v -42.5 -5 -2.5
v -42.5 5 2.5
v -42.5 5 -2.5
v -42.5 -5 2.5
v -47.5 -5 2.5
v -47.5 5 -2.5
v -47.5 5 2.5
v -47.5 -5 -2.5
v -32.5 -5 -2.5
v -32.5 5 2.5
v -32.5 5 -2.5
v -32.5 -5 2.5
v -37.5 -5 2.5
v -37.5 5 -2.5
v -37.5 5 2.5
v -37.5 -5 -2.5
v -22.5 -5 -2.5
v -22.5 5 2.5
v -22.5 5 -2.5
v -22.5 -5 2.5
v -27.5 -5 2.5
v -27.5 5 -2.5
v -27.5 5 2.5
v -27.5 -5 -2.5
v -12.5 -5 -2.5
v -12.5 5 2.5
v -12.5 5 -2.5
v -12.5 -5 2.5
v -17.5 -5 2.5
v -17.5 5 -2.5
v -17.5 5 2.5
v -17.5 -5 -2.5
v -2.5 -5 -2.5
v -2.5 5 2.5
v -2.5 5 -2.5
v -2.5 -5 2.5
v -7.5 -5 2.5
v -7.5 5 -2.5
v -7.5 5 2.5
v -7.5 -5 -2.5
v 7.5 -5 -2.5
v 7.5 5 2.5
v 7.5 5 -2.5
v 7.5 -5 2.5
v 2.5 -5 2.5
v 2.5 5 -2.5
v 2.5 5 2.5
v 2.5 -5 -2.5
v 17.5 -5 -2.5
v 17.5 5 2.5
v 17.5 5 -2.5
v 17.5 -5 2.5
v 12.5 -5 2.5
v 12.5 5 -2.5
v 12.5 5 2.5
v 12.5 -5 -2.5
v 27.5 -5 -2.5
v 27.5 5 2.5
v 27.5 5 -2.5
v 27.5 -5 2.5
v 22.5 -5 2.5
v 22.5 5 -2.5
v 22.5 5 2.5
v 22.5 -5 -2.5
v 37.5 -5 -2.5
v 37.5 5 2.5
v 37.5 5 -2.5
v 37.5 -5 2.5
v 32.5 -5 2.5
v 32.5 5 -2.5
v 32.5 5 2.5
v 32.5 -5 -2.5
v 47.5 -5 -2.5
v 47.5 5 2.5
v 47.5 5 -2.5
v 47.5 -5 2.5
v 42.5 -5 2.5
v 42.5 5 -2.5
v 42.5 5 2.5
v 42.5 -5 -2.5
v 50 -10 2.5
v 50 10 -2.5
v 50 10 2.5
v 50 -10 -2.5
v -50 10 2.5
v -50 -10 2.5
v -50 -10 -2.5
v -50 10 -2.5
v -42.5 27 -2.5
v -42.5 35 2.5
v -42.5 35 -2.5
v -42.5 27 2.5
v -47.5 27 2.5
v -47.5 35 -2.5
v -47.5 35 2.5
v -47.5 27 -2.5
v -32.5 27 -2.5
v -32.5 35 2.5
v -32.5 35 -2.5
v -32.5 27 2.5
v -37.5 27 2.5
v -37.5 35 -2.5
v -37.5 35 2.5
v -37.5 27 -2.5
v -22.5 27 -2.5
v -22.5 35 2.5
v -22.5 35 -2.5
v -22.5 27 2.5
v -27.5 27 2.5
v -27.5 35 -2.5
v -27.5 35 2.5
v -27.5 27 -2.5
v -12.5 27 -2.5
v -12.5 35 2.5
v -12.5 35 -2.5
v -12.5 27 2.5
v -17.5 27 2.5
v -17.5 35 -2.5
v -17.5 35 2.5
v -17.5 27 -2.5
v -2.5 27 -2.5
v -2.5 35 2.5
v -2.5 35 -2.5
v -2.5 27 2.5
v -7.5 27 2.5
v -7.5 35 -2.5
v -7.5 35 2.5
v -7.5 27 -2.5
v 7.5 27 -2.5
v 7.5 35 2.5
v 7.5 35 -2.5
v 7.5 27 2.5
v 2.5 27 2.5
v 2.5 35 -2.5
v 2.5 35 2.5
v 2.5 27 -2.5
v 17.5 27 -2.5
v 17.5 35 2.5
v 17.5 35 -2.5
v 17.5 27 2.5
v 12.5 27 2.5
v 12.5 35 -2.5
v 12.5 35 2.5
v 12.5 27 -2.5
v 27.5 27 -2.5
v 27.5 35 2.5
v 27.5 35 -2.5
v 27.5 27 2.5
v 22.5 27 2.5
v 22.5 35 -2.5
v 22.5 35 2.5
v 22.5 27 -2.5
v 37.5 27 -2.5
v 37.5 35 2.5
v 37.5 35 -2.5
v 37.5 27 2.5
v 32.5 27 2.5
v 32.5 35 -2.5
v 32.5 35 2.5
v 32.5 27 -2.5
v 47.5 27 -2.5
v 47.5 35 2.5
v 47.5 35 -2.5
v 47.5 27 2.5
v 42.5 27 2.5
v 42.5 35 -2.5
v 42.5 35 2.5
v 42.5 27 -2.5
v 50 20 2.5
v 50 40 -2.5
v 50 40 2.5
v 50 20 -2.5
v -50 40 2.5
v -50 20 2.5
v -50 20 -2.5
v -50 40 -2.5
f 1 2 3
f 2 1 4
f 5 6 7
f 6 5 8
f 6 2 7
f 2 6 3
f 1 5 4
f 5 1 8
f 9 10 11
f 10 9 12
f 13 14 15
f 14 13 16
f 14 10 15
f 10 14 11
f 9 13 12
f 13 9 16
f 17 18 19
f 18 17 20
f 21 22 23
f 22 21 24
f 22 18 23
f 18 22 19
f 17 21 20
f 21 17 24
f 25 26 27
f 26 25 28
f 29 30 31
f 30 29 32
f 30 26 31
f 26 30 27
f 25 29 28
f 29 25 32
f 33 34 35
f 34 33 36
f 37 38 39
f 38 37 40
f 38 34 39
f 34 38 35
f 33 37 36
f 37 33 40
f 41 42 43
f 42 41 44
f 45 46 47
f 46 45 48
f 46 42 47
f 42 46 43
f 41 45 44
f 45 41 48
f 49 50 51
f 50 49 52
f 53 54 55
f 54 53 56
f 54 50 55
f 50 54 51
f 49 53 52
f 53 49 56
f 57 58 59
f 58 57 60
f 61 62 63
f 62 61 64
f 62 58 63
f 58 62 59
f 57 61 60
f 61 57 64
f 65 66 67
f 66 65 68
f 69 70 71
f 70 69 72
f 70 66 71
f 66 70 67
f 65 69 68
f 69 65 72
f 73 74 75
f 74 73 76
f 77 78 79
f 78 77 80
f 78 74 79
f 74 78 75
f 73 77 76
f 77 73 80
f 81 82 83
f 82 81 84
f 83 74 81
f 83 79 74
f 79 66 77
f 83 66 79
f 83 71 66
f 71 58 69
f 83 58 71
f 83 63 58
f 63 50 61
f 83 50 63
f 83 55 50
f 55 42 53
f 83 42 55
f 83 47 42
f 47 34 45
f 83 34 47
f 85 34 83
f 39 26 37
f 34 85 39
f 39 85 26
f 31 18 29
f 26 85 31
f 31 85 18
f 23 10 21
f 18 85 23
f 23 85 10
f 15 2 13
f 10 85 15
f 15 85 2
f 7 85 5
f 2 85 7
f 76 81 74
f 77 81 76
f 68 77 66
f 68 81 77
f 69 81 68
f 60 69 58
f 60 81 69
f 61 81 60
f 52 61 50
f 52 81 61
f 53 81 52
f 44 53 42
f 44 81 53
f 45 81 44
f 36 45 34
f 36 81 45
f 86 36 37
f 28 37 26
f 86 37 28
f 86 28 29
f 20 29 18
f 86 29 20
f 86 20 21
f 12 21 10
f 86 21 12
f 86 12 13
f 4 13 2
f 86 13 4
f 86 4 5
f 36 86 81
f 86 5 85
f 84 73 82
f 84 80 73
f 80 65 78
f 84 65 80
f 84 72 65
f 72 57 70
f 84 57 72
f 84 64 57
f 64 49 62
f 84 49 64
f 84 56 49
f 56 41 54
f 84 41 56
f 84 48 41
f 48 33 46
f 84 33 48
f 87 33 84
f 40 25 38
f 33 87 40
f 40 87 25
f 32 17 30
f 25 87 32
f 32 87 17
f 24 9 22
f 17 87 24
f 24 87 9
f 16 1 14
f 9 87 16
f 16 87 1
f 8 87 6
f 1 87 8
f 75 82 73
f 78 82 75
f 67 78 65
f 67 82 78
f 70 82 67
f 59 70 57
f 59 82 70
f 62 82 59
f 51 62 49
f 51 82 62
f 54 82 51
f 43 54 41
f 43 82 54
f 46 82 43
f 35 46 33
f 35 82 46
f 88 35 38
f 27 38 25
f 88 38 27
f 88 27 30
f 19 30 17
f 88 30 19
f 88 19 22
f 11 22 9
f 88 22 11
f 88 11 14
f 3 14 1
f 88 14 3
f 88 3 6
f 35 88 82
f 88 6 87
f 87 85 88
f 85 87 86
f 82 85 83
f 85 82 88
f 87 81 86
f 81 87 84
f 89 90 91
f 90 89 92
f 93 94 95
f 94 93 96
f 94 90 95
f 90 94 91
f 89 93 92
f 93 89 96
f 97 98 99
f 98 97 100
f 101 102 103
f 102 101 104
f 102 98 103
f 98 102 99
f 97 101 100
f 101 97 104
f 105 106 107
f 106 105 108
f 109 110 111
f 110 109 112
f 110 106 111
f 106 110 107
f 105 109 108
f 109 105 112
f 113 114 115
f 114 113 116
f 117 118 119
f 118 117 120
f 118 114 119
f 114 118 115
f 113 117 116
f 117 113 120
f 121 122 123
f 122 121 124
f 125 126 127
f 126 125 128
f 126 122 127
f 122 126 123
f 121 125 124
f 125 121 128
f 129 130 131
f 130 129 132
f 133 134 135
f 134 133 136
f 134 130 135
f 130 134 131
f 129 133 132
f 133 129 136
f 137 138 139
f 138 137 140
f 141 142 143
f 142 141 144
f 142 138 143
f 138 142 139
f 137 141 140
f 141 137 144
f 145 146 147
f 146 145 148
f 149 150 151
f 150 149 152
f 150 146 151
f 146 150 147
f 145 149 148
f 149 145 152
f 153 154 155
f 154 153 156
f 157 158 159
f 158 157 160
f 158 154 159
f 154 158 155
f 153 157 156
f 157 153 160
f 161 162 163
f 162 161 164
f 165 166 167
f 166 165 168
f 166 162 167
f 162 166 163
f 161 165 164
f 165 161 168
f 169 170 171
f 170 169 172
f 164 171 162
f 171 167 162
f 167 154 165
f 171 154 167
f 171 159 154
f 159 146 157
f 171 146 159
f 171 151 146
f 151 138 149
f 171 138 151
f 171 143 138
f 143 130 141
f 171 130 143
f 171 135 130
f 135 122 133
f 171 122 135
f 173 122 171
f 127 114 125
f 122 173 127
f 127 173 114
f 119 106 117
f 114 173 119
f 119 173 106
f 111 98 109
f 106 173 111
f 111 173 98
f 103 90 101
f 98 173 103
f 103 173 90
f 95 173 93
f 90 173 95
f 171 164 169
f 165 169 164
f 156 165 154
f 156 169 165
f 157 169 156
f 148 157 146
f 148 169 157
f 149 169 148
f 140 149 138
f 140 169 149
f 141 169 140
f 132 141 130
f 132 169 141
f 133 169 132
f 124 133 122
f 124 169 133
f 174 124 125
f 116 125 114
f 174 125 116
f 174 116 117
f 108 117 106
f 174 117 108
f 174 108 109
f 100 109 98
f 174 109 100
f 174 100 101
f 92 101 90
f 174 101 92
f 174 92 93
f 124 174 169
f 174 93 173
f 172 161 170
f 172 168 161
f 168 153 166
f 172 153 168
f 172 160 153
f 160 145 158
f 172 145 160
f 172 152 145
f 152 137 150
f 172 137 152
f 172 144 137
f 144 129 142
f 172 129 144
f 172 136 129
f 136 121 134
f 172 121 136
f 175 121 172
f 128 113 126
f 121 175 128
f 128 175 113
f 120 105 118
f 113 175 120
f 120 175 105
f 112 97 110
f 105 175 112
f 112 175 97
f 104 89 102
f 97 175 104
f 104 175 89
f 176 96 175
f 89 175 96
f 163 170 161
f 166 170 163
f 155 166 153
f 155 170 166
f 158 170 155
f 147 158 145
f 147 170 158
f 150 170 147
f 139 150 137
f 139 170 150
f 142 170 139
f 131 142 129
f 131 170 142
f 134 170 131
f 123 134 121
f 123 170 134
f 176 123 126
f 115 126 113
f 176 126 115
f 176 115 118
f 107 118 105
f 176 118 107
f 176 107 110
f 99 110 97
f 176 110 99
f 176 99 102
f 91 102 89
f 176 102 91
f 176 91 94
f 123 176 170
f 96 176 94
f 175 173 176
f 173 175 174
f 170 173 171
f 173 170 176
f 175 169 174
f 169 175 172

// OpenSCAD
/*
 * A set of modules for creating bolt holes at specific sizes
 *
 * All of these modules will render flat on the XY plane and centered on the origin.
 * Heights are measured along the Y axis.
 * Widths are measured along the X axis.
 * Thickness are measured along the Z axis.
 */

/*
 * M mounting hole. Radius is (Msize/2) + 0.25mm
 * The 0.5mm gives some extra room so the bolt does not get restricted by the plastic & is free to move.
 *
 * size The size of the hole, e.g. 4 for a M4 bolt
 * t    The thickness of the material the hole is in
 */
module MHole(size,t) {
    translate([0, 0, -1]) cylinder( r=(size/2)+.5, h=t+2, $fn=80);
}

/*
 * A rectangular slotted hole for bolts, used so there's some directional movement in attaching something.
 *
 * boltSize     The diameter of the bolt this slot is to fit. 0.5mm either side will be included in the slot
 * height       The height of the slot in mm
 * thickness    The thickness of the material the slot is to cut out.
 */
 module BoltSlot( boltSize,height, thickness) {
    translate([-(boltSize+1)/2,-height/2,-(thickness+1)/2])
        cube([boltSize+1, height, thickness+1]);
 }

/*
 * A bar with multiple slots cut out of it
 *
 * width The width of the bar
 * height The height of the bar
 * thickness The thickness of the bar
 * boltSize The size of bolt that will be used in the slot, remember slots are 10mm apart!
 * baseOffset The offset from the bottom to the bottom of the slot
 * topOffset The offset from the top of the slot from the top of the bar
 */
module SlottedBar(width, height, thickness, boltSize, baseOffset, topOffset) {
    bo = baseOffset <=0 ? thickness : baseOffset;
    to = topOffset <= 0 ? thickness : topOffset;
    
    // Y offset to middle of slot
    dy = baseOffset + ((height-baseOffset-topOffset)/2);
    
    // last slot index that fits, first slot is #0
    numSlots = floor(width/10)-1;
    
    translate([-width/2, -height/2, -thickness/2])
        difference() {
            // Actual bar
            cube([width, height, thickness]);
            for( n = [0:numSlots] ) {
                translate([ 5+(10*n), dy, thickness/2 ])
                    BoltSlot( boltSize, height-baseOffset-topOffset, thickness );
            }
        }
}

SlottedBar( 100, 20, 5, 4, 5, 5 );

translate([0,30,0])
SlottedBar( 100, 20, 5, 4, 7, 5 );

//BoltSlot( 4, 20, 5);
